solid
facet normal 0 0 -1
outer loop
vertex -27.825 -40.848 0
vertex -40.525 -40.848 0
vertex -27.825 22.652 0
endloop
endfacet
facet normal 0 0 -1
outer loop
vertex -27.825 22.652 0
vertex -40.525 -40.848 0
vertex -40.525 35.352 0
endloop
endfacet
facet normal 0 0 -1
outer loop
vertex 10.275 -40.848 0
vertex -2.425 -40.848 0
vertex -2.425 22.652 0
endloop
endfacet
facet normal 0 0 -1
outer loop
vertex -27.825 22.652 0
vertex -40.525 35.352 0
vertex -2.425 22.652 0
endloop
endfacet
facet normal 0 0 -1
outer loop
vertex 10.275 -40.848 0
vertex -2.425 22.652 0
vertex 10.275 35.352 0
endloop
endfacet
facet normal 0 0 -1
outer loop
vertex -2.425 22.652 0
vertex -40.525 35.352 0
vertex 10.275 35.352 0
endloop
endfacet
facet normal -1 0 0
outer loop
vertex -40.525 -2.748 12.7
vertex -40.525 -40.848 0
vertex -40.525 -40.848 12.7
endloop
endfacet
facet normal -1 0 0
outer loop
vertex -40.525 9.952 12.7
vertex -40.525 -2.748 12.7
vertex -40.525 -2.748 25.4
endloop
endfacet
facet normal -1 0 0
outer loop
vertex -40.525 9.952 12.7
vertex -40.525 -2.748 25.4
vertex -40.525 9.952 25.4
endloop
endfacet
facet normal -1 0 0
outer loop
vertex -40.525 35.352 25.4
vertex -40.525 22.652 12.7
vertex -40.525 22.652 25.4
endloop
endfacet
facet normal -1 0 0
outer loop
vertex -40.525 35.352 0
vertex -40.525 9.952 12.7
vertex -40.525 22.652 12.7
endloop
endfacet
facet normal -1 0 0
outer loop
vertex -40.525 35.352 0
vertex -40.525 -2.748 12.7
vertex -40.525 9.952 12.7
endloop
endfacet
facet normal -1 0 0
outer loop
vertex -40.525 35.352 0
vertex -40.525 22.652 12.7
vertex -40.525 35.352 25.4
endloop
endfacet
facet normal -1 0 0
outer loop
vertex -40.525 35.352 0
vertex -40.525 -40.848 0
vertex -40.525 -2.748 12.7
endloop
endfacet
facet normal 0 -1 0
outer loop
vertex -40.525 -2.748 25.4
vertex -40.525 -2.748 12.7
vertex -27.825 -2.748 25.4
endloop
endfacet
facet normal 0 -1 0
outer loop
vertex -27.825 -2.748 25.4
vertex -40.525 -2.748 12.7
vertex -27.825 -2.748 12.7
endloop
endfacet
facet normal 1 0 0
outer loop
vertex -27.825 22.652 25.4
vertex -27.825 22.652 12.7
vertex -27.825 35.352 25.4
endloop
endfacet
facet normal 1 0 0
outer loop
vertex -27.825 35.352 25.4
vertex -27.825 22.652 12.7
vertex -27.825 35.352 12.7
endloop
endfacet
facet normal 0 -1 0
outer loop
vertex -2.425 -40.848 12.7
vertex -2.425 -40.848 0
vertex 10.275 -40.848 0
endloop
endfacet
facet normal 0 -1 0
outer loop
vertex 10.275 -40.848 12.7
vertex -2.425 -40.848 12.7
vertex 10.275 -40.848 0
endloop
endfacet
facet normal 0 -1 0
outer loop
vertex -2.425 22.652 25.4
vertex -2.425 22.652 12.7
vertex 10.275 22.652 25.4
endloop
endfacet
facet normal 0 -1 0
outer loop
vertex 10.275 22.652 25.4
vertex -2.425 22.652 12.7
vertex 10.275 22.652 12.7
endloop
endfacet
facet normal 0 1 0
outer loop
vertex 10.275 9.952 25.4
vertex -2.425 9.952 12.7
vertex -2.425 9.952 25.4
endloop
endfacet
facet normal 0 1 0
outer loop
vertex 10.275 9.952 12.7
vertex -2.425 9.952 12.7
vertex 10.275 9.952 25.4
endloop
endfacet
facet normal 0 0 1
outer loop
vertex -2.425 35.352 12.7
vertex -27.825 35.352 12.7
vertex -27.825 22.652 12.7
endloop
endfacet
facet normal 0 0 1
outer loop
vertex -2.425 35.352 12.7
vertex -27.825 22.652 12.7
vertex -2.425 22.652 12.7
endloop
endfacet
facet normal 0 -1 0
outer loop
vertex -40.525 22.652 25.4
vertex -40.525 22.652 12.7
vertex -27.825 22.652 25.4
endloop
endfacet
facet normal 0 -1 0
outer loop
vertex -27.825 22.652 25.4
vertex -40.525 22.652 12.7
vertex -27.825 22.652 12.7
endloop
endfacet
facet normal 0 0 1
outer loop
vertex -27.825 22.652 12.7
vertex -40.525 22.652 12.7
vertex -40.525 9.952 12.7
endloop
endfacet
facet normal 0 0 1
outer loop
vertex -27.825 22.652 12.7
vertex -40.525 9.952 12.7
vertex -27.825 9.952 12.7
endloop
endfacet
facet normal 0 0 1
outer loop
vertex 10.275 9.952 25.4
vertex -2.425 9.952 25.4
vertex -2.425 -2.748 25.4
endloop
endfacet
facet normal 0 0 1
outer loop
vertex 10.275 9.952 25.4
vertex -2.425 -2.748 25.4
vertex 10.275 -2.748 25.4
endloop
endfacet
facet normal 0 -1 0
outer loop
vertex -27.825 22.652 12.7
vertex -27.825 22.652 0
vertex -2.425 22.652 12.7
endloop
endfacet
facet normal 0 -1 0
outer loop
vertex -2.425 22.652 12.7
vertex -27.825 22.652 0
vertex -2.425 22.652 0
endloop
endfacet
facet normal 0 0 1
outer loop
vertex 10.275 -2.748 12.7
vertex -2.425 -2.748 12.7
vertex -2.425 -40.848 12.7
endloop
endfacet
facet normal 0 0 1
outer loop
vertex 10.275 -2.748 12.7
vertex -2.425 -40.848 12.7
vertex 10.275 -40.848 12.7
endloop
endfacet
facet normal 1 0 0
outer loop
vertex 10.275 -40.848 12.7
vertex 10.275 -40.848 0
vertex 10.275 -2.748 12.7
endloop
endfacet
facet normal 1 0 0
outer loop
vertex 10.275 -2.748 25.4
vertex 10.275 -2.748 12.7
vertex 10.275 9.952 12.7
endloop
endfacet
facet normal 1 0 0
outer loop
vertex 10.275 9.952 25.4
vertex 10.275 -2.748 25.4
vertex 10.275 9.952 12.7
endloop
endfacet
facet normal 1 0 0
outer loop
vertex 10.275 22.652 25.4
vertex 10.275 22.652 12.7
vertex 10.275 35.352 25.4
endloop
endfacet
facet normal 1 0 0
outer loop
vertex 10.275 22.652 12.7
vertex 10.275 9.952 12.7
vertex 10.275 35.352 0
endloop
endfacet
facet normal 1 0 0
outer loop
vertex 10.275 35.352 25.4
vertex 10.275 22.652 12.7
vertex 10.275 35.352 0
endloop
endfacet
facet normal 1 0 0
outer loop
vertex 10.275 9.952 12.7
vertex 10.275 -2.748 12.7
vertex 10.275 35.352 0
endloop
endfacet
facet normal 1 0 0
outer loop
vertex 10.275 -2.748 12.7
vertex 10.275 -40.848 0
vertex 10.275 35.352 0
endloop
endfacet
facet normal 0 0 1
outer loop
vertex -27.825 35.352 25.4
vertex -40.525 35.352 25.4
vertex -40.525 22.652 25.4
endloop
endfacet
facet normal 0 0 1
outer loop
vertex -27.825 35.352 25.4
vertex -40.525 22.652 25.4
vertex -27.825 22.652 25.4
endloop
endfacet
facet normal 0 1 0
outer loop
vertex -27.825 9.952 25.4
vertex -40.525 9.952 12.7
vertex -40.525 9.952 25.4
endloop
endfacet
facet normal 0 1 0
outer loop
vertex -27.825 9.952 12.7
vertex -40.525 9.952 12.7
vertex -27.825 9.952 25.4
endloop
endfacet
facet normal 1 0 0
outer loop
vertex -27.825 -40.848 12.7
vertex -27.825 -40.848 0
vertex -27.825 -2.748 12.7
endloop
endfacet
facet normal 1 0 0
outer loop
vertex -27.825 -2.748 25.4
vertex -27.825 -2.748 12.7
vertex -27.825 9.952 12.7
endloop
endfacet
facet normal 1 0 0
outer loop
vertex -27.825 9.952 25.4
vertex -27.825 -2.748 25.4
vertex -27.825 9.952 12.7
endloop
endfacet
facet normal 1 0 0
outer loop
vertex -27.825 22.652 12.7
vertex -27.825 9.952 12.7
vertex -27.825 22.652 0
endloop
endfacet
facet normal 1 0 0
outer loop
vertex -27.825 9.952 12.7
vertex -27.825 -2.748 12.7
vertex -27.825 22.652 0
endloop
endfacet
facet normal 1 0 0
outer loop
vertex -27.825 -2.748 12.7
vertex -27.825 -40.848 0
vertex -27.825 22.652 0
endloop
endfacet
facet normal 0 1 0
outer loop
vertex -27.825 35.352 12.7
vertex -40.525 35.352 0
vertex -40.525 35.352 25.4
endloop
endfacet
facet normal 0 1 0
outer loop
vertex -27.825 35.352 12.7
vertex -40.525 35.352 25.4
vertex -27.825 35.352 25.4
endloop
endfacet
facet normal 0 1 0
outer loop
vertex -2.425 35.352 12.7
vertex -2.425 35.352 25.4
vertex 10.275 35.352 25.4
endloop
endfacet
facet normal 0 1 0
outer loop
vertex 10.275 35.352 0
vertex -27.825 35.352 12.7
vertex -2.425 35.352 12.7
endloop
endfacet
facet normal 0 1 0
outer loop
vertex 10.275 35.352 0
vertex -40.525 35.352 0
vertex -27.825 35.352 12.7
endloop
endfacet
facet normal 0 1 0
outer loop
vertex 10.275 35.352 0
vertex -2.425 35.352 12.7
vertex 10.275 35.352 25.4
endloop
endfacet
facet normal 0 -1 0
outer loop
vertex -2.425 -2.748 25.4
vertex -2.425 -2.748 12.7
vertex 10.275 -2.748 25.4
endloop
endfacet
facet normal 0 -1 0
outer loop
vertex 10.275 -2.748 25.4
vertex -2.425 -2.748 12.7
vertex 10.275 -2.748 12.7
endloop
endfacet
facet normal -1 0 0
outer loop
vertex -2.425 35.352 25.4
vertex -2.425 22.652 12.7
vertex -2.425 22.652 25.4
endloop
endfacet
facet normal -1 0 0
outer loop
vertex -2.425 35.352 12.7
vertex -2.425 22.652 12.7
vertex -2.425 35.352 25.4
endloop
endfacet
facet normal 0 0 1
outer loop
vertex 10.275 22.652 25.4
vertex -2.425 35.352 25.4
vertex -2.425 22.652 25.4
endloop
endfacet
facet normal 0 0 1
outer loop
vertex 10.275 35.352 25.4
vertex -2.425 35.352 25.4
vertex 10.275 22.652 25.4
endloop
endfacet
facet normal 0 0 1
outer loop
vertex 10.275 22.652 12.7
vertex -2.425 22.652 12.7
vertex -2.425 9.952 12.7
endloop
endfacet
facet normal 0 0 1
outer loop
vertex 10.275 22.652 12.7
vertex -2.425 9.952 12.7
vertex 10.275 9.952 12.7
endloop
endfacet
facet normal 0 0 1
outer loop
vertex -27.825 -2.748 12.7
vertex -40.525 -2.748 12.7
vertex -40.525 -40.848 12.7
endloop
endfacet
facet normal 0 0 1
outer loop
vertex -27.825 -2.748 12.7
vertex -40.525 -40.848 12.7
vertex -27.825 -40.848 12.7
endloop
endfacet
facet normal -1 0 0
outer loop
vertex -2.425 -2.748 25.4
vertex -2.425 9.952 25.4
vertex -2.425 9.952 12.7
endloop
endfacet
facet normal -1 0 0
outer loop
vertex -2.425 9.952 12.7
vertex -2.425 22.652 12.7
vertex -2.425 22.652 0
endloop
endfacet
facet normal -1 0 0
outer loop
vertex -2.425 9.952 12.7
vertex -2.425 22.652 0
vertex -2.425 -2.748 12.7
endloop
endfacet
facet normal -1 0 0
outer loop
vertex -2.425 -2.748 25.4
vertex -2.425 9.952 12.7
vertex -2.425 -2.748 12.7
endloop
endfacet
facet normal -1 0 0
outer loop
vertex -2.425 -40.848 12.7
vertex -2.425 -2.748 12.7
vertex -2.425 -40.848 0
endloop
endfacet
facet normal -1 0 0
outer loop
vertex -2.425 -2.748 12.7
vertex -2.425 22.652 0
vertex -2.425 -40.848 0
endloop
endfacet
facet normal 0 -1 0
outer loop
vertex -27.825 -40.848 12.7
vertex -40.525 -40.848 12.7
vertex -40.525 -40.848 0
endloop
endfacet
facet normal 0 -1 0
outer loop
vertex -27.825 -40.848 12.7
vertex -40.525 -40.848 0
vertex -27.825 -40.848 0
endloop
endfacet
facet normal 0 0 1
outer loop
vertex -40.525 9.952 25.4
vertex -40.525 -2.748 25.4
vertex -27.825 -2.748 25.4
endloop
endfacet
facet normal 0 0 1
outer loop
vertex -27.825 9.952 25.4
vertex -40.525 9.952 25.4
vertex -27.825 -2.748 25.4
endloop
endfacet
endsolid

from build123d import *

# Parameters (mm, degrees)
F1_DEPTH = 12.7
F2_W     = 12.7
F2_H     = 12.7
F3_DEPTH = 12.7


with BuildPart() as f1:
    # F0 (on Top) → F1 (new body)
    with BuildSketch(Plane.XY):
        Polygon((-40.525064, 35.351565), (-40.525064, -40.848435), (-27.825064, -40.848435), (-27.825064, 22.651565), (-2.425064, 22.651565), (-2.425064, -40.848435), (10.274936, -40.848435), (10.274936, 35.351565), align=None)
    extrude(amount=F1_DEPTH)

    # F2 (on face) → F3 (join)
    with BuildSketch(Plane.XY.offset(12.7)):
        with Locations((-34.175064, 3.601565)):
            Rectangle(F2_W, F2_H)
        with Locations((-34.175064, 29.001565)):
            Rectangle(F2_W, F2_H)
        with Locations((3.924936, 29.001565)):
            Rectangle(F2_W, F2_H)
        with Locations((3.924936, 3.601565)):
            Rectangle(F2_W, F2_H)
    extrude(amount=F3_DEPTH)


solid = f1.part
